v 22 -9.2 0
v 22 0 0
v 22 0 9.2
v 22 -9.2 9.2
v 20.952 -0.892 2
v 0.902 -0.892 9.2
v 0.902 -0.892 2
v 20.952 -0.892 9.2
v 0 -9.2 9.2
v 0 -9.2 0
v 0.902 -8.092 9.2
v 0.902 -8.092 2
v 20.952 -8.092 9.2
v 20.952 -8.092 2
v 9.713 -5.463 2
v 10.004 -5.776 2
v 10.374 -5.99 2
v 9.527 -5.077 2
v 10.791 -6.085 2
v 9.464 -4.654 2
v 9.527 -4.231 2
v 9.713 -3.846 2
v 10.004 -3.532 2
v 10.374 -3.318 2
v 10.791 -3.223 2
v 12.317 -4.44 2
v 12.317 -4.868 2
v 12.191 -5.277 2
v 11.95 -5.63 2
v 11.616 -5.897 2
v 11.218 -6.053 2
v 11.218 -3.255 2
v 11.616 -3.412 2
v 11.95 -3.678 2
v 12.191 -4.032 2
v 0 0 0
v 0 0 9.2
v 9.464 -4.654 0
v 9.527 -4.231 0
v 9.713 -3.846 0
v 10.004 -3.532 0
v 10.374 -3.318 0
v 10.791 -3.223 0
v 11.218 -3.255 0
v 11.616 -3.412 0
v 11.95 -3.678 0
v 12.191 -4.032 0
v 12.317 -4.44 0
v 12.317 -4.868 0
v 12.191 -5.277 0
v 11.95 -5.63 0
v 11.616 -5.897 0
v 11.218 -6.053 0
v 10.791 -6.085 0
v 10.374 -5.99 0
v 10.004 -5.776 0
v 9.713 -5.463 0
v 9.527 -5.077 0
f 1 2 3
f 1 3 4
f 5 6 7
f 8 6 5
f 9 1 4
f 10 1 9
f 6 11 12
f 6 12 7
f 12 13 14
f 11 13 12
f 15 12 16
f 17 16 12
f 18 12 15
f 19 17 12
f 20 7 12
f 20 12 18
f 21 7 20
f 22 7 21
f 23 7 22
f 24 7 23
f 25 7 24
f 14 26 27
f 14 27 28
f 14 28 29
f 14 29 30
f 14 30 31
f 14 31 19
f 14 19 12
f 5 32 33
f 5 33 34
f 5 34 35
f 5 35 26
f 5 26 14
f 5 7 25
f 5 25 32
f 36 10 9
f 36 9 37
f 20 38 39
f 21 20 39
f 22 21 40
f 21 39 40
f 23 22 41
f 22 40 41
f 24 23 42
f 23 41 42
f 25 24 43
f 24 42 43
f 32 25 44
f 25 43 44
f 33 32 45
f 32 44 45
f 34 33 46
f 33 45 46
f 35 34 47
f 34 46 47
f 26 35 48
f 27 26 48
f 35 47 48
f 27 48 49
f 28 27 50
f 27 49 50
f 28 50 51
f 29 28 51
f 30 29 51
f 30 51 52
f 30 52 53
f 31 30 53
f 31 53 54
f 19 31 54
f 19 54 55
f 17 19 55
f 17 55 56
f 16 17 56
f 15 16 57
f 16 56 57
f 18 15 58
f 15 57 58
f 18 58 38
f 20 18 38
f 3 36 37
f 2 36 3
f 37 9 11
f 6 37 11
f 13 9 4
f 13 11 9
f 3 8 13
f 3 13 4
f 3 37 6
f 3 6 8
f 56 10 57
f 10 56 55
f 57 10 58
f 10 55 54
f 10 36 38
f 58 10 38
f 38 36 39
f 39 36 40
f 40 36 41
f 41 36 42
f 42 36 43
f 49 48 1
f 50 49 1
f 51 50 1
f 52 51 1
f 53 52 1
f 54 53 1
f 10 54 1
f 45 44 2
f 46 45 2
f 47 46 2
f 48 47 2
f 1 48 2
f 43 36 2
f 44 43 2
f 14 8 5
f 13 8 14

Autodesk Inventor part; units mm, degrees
ref_plane "YZ Plane" through (0, 0, 0) normal (1, 0, 0) x (0, 1, 0)
ref_plane "XZ Plane" through (0, 0, 0) normal (0, 1, 0) x (-1, 0, 0)
ref_plane "XY Plane" through (0, 0, 0) normal (0, 0, 1) x (1, 0, 0)
sketch "Sketch1" plane through (0, 0, 0) normal (0, 0, 1) x (1, 0, 0)
  line L0 (0, 0) -> (22, 0)
  line L1 (22, 0) -> (22, -9.2)
  line L2 (22, -9.2) -> (0, -9.2)
  line L3 (0, -9.2) -> (0, 0)
  dimension "d0" = 22
  dimension "d1" = 9.2
extrude "Extrusion1" add sketch "Sketch1" along normal blind 9.2
sketch "Sketch2" plane through (0, 0, 9.2) normal (0, 0, 1) x (1, 0, 0)
  line L0 (0.9024, -0.8915) -> (20.9524, -0.8915)
  line L1 (20.9524, -0.8915) -> (20.9524, -8.0915)
  line L2 (20.9524, -8.0915) -> (0.9024, -8.0915)
  line L3 (0.9024, -8.0915) -> (0.9024, -0.8915)
  point P0 (0, 0)
  dimension "d4" = 20.05
  dimension "d5" = 7.2
extrude "Extrusion2" cut sketch "Sketch2" against normal blind 7.2
sketch "Sketch3" plane through (0, 0, 0) normal (0, 0, -1) x (-1, 0, 0)
  circle A0 centre (-10.8985, -4.6543) radius 1.435
  point P0 (0, 0)
  dimension "d8" = 2.87
extrude "Extrusion3" cut sketch "Sketch3" against normal blind 7.2
properties part number "Fader Cap"
